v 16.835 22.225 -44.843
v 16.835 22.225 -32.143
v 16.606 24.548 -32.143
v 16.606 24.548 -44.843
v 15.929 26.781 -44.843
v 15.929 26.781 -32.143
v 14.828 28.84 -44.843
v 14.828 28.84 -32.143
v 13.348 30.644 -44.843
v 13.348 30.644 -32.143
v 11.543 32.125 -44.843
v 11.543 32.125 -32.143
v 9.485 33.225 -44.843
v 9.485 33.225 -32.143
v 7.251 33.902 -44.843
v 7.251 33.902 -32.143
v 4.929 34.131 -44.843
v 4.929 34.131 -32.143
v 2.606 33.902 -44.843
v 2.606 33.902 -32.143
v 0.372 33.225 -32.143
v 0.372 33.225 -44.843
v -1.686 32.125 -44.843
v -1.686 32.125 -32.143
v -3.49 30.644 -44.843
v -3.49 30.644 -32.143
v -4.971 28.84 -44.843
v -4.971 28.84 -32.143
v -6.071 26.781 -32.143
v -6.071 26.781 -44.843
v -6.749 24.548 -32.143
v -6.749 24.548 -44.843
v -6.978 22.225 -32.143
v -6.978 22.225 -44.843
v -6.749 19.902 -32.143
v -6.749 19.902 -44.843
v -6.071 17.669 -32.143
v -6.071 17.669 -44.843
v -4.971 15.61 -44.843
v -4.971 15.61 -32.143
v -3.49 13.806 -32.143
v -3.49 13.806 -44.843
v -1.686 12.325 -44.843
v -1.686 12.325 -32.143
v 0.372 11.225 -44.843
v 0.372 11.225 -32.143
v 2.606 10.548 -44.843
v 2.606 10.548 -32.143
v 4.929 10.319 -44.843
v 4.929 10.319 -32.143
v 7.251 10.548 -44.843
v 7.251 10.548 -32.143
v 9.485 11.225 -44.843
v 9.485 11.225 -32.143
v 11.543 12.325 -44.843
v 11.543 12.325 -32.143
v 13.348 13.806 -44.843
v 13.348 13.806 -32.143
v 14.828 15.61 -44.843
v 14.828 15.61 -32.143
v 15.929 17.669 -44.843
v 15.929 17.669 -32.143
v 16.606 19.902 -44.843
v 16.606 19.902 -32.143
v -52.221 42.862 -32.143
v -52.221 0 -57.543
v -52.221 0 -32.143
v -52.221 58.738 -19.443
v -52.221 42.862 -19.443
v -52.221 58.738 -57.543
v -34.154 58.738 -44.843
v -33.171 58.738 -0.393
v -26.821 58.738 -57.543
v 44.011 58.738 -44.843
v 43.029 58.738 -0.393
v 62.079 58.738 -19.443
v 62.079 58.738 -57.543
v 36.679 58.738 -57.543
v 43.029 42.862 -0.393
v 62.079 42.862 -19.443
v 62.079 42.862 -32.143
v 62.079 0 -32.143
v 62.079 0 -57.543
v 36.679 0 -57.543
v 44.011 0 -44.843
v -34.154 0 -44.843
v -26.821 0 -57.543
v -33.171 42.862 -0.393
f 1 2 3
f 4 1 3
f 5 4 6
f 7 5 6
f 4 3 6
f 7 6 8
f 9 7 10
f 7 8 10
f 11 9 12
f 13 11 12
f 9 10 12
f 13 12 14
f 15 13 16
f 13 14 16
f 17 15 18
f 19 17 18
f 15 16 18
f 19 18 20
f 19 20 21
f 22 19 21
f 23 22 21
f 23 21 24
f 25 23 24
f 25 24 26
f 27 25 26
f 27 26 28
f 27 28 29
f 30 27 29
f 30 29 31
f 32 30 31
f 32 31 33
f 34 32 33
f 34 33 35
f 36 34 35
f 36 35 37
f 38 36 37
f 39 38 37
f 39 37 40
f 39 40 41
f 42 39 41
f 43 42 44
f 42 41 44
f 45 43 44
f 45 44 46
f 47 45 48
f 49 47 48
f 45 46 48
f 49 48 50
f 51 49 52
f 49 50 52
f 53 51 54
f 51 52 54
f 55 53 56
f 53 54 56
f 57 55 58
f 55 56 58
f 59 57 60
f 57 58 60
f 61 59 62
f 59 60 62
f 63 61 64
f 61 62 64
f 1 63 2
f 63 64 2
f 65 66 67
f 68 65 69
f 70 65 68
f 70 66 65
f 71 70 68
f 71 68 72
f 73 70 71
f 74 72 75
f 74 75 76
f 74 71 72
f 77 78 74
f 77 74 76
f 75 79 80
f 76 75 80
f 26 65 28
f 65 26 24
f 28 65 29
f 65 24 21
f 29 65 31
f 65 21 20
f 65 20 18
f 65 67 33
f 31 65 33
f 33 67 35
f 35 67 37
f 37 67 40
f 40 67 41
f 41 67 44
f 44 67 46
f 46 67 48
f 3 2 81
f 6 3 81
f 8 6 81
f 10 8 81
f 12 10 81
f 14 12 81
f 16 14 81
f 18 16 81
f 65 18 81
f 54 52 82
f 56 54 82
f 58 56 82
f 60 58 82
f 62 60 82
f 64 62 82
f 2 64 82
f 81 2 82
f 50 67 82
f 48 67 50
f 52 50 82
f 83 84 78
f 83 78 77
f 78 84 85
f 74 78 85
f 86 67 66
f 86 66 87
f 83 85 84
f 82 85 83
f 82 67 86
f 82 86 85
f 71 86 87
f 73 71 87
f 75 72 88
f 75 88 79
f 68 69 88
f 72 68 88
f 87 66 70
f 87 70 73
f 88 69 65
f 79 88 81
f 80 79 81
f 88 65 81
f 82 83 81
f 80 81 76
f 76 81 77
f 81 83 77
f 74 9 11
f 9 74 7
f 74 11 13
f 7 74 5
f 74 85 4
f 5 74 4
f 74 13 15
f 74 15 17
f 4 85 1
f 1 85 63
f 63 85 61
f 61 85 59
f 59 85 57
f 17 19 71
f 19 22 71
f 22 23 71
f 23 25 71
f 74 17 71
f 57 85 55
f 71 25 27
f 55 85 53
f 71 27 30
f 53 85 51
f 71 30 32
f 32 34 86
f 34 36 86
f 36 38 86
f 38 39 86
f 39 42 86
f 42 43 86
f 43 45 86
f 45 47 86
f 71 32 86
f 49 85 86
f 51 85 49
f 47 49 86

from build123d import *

# Parameters (mm, degrees)
F0_W     = 114.3
F0_H     = 25.4
F1_DEPTH = 58.7375
F2_W     = 114.3
F2_H     = 15.875
F3_DEPTH = 31.75
F5_DEPTH = 15.876
F6_R     = 11.90625
F7_DEPTH = 25.401
F9_DEPTH = 58.7385


with BuildPart() as f1:
    # F0 (on Front) → F1 (new body)
    with BuildSketch(Plane.XZ):
        with Locations((4.9286, -44.843187)):
            Rectangle(F0_W, F0_H)
    extrude(amount=-F1_DEPTH)

    # F2 (on face) → F3 (join)
    with BuildSketch(Plane.XY.offset(-32.143187)):
        with Locations((4.9286, 50.8)):
            Rectangle(F2_W, F2_H)
    extrude(amount=F3_DEPTH)

    # F4 (on face) → F5 (cut, through all)
    with BuildSketch(Plane.XZ.offset(-42.8625)):
        Polygon((-52.2214, -0.393187), (-52.2214, -19.443187), (-33.1714, -0.393187), align=None)
        Polygon((62.0786, -0.393187), (43.0286, -0.393187), (62.0786, -19.443187), align=None)
    extrude(amount=-F5_DEPTH, mode=Mode.SUBTRACT)

    # F6 (on face) → F7 (cut, through all)
    with BuildSketch(Plane.XY.offset(-32.143187)):
        with Locations((4.9286, 22.225)):
            Circle(F6_R)
    extrude(amount=-F7_DEPTH, mode=Mode.SUBTRACT)

    # F8 (on face) → F9 (cut, through all)
    with BuildSketch(Plane.XZ):
        Polygon((44.010948, -44.843187), (-34.153748, -44.843187), (-26.8214, -57.543187), (36.6786, -57.543187), align=None)
    extrude(amount=-F9_DEPTH, mode=Mode.SUBTRACT)


solid = f1.part
